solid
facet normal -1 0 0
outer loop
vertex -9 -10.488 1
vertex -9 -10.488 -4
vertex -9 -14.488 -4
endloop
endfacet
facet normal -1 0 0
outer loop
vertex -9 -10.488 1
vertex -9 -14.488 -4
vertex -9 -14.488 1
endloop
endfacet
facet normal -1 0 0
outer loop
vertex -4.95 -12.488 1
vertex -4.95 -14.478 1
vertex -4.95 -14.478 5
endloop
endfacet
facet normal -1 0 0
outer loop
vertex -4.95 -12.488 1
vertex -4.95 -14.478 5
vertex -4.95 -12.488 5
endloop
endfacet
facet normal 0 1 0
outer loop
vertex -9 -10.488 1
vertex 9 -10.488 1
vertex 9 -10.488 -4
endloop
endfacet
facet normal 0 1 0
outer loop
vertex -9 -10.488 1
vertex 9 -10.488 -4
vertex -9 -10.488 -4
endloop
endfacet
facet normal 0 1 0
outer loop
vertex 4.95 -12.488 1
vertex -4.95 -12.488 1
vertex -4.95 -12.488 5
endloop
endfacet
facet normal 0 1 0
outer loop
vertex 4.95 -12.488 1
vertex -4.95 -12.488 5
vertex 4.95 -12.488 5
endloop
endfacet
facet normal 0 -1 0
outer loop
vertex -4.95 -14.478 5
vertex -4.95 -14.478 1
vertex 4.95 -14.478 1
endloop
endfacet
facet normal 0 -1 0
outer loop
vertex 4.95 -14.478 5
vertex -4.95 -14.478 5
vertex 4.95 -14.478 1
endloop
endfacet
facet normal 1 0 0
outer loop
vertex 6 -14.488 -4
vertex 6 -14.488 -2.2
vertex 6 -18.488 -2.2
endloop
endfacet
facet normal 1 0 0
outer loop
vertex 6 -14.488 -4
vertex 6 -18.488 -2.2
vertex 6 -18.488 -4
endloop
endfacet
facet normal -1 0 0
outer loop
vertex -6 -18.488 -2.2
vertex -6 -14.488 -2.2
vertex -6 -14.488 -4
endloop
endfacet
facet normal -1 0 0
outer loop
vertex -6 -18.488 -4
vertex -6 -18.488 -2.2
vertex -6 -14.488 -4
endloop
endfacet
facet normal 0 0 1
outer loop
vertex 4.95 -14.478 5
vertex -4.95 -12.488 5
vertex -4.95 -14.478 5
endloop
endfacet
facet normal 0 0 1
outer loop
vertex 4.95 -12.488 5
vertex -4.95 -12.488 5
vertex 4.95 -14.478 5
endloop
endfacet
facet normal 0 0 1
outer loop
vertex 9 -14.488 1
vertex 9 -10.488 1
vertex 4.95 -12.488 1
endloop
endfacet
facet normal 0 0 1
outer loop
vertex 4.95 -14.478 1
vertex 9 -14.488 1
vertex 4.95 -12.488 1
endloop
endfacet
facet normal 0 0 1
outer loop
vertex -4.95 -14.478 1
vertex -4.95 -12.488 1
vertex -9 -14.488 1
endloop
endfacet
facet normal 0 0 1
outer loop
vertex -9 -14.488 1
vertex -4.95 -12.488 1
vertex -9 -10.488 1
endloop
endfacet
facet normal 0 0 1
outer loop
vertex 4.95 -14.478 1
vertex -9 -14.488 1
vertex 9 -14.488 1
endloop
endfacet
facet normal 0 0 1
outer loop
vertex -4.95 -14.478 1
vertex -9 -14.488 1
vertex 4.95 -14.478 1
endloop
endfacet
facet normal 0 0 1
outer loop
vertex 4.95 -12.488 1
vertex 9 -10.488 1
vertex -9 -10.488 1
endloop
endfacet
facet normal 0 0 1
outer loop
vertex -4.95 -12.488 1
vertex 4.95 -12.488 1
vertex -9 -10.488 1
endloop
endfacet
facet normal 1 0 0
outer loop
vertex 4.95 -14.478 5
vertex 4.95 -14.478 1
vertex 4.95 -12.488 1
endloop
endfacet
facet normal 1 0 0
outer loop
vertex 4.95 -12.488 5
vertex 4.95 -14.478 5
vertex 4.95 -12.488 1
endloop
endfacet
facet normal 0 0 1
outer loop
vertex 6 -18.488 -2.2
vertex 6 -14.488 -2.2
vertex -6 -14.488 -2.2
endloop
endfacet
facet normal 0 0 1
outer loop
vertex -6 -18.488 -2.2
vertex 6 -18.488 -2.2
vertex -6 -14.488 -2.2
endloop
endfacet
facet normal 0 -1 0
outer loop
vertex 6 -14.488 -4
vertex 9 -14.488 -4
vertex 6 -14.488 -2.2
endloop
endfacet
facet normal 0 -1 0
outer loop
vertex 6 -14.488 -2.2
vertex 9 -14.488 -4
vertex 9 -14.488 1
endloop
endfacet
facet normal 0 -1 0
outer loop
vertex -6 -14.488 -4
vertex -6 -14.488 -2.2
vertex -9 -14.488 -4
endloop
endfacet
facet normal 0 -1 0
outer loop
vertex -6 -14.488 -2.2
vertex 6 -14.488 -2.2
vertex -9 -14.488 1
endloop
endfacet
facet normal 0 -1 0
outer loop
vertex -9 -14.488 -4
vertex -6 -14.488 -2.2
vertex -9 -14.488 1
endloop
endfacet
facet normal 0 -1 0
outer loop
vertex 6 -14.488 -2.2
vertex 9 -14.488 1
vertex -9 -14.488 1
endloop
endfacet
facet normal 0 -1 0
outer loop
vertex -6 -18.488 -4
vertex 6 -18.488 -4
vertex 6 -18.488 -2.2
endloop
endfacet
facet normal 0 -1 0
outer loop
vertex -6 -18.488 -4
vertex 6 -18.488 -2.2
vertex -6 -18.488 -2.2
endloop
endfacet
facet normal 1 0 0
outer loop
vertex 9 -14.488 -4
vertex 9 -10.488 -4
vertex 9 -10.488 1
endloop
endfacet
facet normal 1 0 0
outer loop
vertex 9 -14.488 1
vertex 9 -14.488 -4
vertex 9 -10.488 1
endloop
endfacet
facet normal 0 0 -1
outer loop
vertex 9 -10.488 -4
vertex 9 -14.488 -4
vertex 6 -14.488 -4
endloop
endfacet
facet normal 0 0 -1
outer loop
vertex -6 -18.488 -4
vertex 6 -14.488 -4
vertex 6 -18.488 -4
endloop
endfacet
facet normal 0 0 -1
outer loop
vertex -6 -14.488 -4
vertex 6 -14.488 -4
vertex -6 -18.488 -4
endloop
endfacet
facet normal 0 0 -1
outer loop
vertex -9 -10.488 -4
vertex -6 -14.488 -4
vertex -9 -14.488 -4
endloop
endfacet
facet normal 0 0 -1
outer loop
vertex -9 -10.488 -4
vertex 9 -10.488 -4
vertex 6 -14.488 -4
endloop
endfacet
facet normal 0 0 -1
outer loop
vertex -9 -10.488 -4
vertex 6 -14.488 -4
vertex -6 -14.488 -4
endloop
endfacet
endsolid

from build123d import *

# Parameters (mm, degrees)
SKETCH008_W  = 18
SKETCH008_H  = 5
PAD008_DEPTH = 4
SKETCH010_W  = 9.9
SKETCH010_H  = 1.99
PAD009_DEPTH = 4
SKETCH011_W  = 12
SKETCH011_H  = 1.8
PAD010_DEPTH = 4


with BuildPart() as part:
    # Sketch008 → Pad008 (new body)
    with BuildSketch(Plane(origin=(0, -10.4875, 0), x_dir=(-1, 0, 0), z_dir=(0, 1, 0))):
        with Locations((0, -1.5)):
            Rectangle(SKETCH008_W, SKETCH008_H)
    extrude(amount=-PAD008_DEPTH)

    # Sketch010 → Pad009 (new body)
    with BuildSketch(Plane(origin=(0, -10.4875, 1), x_dir=(1, 0, 0), z_dir=(0, 0, 1))):
        with Locations((0, -2.995)):
            Rectangle(SKETCH010_W, SKETCH010_H)
    extrude(amount=PAD009_DEPTH)

    # Sketch011 → Pad010 (new body)
    with BuildSketch(Plane(origin=(0, -14.4875, 0), x_dir=(-1, 0, 0), z_dir=(0, -1, 0))):
        with Locations((0, 3.1)):
            Rectangle(SKETCH011_W, SKETCH011_H)
    extrude(amount=PAD010_DEPTH)


solid = part.part
